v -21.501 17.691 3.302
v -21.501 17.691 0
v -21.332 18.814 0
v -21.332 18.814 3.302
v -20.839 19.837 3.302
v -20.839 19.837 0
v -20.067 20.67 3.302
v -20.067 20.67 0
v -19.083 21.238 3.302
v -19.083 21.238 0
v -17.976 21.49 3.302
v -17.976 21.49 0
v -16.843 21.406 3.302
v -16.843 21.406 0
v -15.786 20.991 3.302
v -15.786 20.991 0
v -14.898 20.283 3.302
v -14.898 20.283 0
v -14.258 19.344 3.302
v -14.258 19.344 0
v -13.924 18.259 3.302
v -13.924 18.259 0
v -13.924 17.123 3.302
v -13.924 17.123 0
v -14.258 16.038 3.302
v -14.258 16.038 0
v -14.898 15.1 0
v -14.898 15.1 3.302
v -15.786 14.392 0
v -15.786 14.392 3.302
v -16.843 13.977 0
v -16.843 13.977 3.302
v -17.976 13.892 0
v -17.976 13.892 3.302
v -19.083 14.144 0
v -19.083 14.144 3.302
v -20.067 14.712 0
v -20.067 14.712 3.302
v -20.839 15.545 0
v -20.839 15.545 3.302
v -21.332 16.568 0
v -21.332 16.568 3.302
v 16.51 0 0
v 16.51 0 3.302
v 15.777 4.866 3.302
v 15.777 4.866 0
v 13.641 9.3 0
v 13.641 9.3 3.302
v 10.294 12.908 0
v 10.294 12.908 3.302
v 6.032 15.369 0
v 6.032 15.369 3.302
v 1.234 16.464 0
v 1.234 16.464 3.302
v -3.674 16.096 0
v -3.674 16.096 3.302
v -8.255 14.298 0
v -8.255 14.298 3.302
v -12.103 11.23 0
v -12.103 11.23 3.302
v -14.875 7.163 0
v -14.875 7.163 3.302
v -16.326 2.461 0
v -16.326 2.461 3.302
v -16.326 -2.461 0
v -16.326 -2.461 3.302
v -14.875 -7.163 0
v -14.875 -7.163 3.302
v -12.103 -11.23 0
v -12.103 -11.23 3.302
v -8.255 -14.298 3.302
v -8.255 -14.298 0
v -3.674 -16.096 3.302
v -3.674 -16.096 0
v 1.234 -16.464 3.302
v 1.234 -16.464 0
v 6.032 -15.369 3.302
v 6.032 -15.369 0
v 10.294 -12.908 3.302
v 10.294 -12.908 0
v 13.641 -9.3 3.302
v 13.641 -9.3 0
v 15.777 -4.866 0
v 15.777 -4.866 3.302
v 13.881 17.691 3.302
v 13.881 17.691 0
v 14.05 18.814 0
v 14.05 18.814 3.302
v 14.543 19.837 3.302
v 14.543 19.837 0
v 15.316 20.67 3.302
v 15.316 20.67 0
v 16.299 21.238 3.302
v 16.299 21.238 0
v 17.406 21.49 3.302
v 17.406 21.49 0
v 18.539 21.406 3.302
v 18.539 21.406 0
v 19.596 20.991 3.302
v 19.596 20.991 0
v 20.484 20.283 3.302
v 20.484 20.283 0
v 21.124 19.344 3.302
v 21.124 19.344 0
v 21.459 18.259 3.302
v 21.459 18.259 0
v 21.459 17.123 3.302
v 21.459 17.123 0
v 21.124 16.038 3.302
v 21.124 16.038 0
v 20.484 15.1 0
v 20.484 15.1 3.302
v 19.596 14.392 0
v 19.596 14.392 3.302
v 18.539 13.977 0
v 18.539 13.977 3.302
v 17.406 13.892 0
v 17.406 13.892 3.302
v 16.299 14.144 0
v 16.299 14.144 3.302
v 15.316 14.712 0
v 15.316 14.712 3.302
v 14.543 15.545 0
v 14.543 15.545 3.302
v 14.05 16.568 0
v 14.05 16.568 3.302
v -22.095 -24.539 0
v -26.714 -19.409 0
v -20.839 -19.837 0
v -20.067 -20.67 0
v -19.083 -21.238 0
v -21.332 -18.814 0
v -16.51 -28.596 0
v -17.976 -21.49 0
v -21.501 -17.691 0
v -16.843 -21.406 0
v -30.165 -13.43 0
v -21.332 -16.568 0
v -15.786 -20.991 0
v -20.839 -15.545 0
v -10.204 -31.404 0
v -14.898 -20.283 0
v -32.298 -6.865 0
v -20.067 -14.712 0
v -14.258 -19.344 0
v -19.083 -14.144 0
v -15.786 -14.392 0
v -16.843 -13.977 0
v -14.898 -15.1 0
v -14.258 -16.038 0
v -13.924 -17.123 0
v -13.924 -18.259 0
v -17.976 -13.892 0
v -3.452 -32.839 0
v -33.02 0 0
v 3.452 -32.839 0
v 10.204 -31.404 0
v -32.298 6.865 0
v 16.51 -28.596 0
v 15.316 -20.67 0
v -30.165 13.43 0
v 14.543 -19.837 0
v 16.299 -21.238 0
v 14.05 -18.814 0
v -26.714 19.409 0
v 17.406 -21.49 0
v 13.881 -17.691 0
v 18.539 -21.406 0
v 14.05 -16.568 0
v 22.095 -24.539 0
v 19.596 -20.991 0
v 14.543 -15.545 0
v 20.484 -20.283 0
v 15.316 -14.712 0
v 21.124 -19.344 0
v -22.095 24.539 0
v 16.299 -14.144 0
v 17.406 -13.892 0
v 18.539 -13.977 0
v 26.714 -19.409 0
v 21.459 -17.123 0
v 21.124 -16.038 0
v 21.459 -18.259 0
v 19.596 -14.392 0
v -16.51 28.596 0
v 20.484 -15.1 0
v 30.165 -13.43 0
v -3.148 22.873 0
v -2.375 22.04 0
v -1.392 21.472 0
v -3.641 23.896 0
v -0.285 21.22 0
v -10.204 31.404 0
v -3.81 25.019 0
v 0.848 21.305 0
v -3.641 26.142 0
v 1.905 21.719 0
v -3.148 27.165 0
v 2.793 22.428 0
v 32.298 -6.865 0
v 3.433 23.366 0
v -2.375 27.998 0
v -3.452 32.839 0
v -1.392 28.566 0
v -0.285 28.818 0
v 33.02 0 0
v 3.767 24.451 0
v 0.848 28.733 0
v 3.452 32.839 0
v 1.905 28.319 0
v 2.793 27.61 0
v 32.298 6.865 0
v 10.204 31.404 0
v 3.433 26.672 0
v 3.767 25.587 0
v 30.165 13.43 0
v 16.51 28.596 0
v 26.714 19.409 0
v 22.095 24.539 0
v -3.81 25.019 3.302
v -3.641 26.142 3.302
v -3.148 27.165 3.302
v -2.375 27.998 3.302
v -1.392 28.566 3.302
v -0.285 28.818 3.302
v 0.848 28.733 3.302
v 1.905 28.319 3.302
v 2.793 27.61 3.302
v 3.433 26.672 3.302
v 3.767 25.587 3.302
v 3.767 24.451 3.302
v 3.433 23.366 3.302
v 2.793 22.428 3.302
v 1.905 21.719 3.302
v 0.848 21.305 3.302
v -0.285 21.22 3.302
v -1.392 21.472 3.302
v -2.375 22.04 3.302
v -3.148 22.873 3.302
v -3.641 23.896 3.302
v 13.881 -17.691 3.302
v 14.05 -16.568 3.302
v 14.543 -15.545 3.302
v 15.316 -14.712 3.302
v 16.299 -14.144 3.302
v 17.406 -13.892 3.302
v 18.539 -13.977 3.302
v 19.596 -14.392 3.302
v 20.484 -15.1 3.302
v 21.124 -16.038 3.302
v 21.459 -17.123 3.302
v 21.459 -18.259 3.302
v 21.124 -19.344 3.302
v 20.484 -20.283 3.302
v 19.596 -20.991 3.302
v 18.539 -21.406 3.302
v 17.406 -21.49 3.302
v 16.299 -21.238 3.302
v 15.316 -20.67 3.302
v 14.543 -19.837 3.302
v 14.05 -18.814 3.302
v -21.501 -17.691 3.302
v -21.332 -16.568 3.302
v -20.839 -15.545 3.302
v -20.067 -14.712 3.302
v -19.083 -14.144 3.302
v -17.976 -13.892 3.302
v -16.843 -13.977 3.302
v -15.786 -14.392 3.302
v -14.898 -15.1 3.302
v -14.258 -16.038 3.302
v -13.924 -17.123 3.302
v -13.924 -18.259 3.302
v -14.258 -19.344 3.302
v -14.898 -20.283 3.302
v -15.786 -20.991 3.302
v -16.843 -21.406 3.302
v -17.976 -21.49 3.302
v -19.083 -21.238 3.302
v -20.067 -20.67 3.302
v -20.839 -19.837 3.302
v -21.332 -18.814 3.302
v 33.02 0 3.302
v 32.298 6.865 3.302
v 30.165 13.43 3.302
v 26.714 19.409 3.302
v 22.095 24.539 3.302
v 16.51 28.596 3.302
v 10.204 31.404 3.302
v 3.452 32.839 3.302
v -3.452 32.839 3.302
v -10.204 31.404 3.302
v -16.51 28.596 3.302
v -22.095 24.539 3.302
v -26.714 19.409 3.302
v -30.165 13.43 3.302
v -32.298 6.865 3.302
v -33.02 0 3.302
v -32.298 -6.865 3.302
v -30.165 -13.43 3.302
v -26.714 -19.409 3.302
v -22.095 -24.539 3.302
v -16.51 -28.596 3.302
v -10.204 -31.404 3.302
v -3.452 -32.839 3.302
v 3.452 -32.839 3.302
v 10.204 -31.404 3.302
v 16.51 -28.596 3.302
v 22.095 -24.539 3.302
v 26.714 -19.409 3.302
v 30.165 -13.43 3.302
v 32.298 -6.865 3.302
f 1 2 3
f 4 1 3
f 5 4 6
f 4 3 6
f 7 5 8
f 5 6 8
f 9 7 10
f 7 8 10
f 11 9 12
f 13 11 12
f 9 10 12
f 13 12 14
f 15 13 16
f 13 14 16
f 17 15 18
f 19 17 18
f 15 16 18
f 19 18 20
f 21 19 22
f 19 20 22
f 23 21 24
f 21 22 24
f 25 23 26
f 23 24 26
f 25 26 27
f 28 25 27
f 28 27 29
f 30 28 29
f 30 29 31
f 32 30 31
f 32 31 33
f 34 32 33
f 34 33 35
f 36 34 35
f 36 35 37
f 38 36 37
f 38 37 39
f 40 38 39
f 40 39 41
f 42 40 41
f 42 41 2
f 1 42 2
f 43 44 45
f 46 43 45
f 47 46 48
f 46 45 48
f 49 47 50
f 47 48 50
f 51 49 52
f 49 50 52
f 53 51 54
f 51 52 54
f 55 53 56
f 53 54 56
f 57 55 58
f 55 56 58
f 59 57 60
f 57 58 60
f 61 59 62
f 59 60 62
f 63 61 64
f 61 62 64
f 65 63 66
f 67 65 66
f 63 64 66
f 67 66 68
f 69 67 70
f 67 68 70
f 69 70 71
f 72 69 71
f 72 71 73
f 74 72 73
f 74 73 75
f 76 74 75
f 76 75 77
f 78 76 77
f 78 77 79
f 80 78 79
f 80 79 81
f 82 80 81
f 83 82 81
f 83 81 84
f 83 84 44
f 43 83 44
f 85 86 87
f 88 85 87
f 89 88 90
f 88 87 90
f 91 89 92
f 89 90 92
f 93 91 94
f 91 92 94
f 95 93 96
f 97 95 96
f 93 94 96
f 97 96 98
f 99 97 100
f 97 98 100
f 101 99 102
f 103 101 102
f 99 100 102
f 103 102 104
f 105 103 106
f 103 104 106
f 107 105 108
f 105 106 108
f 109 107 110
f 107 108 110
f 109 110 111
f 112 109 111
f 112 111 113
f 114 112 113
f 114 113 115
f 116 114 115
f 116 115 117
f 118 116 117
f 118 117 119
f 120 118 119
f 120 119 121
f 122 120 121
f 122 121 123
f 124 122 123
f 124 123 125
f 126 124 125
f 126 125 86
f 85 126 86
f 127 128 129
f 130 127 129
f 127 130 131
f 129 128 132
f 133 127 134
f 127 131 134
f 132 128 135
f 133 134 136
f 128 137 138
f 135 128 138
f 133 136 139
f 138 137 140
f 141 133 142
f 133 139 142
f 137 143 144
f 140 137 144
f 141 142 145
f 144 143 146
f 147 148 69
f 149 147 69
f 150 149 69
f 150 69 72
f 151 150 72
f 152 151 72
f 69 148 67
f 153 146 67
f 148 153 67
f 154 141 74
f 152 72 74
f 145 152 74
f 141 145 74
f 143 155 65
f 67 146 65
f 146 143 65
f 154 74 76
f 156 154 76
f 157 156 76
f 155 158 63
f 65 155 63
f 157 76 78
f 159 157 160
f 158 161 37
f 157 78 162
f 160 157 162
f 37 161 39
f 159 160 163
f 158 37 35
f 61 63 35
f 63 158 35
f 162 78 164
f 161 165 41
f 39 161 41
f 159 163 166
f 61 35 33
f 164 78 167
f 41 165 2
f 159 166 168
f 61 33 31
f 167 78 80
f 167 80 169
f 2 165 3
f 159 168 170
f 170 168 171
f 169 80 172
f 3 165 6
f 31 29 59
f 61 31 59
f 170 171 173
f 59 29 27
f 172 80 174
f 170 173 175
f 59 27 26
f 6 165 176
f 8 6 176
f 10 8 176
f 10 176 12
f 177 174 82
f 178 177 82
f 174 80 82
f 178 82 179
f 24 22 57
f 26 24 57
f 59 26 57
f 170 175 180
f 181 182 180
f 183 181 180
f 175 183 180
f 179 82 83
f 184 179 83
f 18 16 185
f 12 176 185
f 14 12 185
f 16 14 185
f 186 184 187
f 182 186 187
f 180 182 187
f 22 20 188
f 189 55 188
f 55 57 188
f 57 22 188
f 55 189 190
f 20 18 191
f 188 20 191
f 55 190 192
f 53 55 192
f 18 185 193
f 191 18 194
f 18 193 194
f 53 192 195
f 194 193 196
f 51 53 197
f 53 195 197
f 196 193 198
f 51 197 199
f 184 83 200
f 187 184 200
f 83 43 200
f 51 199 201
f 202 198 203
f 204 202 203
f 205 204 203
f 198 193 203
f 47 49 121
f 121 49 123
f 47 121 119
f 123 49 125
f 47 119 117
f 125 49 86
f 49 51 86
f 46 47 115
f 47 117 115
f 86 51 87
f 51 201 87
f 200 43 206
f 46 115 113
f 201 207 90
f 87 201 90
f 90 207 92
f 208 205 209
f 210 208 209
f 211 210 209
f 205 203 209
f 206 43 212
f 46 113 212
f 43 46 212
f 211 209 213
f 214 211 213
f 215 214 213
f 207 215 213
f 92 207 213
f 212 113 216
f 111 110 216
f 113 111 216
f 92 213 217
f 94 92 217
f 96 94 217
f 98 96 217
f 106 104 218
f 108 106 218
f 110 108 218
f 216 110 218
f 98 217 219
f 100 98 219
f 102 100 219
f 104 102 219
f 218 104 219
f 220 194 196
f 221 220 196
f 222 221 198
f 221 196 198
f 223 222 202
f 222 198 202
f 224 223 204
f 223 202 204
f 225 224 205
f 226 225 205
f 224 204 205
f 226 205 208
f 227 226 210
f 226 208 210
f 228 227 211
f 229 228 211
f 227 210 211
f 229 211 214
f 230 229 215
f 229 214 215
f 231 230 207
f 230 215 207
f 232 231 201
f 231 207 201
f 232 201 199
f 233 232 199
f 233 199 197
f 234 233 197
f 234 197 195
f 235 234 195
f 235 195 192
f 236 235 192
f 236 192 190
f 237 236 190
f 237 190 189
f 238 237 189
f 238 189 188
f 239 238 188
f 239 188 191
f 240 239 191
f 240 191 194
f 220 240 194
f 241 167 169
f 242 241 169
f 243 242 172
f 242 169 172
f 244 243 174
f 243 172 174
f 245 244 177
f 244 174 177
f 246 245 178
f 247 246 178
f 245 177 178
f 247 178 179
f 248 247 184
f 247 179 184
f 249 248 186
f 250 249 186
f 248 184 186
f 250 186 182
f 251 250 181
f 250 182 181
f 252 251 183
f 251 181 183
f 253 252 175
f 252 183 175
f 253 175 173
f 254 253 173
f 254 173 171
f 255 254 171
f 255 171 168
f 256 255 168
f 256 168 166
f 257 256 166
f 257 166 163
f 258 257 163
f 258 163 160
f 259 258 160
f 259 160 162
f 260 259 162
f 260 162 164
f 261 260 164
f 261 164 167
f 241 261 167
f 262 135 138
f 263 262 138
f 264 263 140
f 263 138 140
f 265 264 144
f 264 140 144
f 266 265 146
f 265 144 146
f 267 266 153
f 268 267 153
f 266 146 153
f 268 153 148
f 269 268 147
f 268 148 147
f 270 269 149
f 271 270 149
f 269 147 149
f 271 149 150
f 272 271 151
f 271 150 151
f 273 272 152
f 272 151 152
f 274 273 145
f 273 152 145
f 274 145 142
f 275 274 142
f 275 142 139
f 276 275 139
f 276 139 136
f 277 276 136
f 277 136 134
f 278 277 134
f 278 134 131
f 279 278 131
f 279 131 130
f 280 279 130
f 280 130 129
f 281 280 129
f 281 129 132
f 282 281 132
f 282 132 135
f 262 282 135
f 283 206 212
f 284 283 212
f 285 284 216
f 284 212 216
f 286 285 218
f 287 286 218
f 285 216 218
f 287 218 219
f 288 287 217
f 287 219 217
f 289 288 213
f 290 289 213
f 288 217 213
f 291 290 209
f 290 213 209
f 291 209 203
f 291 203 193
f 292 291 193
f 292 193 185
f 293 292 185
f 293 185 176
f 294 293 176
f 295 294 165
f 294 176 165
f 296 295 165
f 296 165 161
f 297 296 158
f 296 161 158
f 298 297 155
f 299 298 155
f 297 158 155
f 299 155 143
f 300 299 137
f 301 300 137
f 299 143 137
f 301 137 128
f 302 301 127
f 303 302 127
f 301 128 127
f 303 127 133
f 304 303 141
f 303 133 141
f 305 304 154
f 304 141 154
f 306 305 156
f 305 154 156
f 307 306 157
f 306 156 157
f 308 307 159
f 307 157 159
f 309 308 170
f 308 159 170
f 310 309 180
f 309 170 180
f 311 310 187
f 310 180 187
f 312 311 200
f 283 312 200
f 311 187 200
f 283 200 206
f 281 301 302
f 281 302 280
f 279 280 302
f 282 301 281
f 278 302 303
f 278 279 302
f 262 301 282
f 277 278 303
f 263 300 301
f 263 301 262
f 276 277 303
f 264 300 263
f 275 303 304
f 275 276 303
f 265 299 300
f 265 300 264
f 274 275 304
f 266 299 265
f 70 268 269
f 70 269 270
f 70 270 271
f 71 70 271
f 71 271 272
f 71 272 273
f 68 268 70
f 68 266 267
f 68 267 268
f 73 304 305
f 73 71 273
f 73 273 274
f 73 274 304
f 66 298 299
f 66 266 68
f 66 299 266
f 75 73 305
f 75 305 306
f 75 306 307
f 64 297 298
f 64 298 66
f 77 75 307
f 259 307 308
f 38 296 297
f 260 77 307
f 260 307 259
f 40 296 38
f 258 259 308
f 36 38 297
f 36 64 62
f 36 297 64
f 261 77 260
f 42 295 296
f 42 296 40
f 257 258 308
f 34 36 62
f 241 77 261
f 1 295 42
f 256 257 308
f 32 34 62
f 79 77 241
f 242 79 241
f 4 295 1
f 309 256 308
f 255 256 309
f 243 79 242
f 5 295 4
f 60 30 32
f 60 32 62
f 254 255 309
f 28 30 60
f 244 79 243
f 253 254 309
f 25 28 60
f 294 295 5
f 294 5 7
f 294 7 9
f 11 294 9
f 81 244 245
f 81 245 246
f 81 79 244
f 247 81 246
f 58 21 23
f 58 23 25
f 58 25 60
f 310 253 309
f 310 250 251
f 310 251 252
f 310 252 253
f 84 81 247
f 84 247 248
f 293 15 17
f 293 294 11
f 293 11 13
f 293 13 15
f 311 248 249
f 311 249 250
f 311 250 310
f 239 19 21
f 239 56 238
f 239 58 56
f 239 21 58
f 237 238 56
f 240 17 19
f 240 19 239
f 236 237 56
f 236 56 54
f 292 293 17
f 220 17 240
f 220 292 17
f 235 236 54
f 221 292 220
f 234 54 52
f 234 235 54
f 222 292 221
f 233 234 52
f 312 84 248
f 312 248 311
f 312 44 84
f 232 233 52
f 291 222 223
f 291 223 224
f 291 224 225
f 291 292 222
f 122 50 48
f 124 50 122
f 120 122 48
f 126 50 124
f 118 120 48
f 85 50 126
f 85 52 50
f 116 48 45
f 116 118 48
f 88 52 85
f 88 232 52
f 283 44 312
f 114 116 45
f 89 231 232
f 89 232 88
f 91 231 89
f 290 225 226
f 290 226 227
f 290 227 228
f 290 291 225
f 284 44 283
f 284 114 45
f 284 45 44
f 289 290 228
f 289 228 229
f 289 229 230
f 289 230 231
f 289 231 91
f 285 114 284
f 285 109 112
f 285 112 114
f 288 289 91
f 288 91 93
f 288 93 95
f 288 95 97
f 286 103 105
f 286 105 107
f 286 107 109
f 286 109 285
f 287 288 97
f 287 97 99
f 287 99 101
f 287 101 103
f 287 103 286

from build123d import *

# Parameters (mm, degrees)
F0_R     = 33.02
F1_DEPTH = 3.302
F2_R     = 16.51
F3_DEPTH = 3.303
F5_D     = 7.62


with BuildPart() as f1:
    # F0 (on Top) → F1 (new body)
    with BuildSketch(Plane.XY):
        Circle(F0_R)
    extrude(amount=F1_DEPTH)

    # F2 (on face) → F3 (cut, through all)
    with BuildSketch(Plane.XY.offset(3.302)):
        Circle(F2_R)
    extrude(amount=-F3_DEPTH, mode=Mode.SUBTRACT)

    # F5 (through all)
    with Locations(Plane.XY.offset(3.302)):
        with Locations((17.691105, -17.691105), (-17.691105, -17.691105), (17.691105, 17.691105), (0, 25.019), (-17.691105, 17.691105)):
            Hole(F5_D / 2)


solid = f1.part
